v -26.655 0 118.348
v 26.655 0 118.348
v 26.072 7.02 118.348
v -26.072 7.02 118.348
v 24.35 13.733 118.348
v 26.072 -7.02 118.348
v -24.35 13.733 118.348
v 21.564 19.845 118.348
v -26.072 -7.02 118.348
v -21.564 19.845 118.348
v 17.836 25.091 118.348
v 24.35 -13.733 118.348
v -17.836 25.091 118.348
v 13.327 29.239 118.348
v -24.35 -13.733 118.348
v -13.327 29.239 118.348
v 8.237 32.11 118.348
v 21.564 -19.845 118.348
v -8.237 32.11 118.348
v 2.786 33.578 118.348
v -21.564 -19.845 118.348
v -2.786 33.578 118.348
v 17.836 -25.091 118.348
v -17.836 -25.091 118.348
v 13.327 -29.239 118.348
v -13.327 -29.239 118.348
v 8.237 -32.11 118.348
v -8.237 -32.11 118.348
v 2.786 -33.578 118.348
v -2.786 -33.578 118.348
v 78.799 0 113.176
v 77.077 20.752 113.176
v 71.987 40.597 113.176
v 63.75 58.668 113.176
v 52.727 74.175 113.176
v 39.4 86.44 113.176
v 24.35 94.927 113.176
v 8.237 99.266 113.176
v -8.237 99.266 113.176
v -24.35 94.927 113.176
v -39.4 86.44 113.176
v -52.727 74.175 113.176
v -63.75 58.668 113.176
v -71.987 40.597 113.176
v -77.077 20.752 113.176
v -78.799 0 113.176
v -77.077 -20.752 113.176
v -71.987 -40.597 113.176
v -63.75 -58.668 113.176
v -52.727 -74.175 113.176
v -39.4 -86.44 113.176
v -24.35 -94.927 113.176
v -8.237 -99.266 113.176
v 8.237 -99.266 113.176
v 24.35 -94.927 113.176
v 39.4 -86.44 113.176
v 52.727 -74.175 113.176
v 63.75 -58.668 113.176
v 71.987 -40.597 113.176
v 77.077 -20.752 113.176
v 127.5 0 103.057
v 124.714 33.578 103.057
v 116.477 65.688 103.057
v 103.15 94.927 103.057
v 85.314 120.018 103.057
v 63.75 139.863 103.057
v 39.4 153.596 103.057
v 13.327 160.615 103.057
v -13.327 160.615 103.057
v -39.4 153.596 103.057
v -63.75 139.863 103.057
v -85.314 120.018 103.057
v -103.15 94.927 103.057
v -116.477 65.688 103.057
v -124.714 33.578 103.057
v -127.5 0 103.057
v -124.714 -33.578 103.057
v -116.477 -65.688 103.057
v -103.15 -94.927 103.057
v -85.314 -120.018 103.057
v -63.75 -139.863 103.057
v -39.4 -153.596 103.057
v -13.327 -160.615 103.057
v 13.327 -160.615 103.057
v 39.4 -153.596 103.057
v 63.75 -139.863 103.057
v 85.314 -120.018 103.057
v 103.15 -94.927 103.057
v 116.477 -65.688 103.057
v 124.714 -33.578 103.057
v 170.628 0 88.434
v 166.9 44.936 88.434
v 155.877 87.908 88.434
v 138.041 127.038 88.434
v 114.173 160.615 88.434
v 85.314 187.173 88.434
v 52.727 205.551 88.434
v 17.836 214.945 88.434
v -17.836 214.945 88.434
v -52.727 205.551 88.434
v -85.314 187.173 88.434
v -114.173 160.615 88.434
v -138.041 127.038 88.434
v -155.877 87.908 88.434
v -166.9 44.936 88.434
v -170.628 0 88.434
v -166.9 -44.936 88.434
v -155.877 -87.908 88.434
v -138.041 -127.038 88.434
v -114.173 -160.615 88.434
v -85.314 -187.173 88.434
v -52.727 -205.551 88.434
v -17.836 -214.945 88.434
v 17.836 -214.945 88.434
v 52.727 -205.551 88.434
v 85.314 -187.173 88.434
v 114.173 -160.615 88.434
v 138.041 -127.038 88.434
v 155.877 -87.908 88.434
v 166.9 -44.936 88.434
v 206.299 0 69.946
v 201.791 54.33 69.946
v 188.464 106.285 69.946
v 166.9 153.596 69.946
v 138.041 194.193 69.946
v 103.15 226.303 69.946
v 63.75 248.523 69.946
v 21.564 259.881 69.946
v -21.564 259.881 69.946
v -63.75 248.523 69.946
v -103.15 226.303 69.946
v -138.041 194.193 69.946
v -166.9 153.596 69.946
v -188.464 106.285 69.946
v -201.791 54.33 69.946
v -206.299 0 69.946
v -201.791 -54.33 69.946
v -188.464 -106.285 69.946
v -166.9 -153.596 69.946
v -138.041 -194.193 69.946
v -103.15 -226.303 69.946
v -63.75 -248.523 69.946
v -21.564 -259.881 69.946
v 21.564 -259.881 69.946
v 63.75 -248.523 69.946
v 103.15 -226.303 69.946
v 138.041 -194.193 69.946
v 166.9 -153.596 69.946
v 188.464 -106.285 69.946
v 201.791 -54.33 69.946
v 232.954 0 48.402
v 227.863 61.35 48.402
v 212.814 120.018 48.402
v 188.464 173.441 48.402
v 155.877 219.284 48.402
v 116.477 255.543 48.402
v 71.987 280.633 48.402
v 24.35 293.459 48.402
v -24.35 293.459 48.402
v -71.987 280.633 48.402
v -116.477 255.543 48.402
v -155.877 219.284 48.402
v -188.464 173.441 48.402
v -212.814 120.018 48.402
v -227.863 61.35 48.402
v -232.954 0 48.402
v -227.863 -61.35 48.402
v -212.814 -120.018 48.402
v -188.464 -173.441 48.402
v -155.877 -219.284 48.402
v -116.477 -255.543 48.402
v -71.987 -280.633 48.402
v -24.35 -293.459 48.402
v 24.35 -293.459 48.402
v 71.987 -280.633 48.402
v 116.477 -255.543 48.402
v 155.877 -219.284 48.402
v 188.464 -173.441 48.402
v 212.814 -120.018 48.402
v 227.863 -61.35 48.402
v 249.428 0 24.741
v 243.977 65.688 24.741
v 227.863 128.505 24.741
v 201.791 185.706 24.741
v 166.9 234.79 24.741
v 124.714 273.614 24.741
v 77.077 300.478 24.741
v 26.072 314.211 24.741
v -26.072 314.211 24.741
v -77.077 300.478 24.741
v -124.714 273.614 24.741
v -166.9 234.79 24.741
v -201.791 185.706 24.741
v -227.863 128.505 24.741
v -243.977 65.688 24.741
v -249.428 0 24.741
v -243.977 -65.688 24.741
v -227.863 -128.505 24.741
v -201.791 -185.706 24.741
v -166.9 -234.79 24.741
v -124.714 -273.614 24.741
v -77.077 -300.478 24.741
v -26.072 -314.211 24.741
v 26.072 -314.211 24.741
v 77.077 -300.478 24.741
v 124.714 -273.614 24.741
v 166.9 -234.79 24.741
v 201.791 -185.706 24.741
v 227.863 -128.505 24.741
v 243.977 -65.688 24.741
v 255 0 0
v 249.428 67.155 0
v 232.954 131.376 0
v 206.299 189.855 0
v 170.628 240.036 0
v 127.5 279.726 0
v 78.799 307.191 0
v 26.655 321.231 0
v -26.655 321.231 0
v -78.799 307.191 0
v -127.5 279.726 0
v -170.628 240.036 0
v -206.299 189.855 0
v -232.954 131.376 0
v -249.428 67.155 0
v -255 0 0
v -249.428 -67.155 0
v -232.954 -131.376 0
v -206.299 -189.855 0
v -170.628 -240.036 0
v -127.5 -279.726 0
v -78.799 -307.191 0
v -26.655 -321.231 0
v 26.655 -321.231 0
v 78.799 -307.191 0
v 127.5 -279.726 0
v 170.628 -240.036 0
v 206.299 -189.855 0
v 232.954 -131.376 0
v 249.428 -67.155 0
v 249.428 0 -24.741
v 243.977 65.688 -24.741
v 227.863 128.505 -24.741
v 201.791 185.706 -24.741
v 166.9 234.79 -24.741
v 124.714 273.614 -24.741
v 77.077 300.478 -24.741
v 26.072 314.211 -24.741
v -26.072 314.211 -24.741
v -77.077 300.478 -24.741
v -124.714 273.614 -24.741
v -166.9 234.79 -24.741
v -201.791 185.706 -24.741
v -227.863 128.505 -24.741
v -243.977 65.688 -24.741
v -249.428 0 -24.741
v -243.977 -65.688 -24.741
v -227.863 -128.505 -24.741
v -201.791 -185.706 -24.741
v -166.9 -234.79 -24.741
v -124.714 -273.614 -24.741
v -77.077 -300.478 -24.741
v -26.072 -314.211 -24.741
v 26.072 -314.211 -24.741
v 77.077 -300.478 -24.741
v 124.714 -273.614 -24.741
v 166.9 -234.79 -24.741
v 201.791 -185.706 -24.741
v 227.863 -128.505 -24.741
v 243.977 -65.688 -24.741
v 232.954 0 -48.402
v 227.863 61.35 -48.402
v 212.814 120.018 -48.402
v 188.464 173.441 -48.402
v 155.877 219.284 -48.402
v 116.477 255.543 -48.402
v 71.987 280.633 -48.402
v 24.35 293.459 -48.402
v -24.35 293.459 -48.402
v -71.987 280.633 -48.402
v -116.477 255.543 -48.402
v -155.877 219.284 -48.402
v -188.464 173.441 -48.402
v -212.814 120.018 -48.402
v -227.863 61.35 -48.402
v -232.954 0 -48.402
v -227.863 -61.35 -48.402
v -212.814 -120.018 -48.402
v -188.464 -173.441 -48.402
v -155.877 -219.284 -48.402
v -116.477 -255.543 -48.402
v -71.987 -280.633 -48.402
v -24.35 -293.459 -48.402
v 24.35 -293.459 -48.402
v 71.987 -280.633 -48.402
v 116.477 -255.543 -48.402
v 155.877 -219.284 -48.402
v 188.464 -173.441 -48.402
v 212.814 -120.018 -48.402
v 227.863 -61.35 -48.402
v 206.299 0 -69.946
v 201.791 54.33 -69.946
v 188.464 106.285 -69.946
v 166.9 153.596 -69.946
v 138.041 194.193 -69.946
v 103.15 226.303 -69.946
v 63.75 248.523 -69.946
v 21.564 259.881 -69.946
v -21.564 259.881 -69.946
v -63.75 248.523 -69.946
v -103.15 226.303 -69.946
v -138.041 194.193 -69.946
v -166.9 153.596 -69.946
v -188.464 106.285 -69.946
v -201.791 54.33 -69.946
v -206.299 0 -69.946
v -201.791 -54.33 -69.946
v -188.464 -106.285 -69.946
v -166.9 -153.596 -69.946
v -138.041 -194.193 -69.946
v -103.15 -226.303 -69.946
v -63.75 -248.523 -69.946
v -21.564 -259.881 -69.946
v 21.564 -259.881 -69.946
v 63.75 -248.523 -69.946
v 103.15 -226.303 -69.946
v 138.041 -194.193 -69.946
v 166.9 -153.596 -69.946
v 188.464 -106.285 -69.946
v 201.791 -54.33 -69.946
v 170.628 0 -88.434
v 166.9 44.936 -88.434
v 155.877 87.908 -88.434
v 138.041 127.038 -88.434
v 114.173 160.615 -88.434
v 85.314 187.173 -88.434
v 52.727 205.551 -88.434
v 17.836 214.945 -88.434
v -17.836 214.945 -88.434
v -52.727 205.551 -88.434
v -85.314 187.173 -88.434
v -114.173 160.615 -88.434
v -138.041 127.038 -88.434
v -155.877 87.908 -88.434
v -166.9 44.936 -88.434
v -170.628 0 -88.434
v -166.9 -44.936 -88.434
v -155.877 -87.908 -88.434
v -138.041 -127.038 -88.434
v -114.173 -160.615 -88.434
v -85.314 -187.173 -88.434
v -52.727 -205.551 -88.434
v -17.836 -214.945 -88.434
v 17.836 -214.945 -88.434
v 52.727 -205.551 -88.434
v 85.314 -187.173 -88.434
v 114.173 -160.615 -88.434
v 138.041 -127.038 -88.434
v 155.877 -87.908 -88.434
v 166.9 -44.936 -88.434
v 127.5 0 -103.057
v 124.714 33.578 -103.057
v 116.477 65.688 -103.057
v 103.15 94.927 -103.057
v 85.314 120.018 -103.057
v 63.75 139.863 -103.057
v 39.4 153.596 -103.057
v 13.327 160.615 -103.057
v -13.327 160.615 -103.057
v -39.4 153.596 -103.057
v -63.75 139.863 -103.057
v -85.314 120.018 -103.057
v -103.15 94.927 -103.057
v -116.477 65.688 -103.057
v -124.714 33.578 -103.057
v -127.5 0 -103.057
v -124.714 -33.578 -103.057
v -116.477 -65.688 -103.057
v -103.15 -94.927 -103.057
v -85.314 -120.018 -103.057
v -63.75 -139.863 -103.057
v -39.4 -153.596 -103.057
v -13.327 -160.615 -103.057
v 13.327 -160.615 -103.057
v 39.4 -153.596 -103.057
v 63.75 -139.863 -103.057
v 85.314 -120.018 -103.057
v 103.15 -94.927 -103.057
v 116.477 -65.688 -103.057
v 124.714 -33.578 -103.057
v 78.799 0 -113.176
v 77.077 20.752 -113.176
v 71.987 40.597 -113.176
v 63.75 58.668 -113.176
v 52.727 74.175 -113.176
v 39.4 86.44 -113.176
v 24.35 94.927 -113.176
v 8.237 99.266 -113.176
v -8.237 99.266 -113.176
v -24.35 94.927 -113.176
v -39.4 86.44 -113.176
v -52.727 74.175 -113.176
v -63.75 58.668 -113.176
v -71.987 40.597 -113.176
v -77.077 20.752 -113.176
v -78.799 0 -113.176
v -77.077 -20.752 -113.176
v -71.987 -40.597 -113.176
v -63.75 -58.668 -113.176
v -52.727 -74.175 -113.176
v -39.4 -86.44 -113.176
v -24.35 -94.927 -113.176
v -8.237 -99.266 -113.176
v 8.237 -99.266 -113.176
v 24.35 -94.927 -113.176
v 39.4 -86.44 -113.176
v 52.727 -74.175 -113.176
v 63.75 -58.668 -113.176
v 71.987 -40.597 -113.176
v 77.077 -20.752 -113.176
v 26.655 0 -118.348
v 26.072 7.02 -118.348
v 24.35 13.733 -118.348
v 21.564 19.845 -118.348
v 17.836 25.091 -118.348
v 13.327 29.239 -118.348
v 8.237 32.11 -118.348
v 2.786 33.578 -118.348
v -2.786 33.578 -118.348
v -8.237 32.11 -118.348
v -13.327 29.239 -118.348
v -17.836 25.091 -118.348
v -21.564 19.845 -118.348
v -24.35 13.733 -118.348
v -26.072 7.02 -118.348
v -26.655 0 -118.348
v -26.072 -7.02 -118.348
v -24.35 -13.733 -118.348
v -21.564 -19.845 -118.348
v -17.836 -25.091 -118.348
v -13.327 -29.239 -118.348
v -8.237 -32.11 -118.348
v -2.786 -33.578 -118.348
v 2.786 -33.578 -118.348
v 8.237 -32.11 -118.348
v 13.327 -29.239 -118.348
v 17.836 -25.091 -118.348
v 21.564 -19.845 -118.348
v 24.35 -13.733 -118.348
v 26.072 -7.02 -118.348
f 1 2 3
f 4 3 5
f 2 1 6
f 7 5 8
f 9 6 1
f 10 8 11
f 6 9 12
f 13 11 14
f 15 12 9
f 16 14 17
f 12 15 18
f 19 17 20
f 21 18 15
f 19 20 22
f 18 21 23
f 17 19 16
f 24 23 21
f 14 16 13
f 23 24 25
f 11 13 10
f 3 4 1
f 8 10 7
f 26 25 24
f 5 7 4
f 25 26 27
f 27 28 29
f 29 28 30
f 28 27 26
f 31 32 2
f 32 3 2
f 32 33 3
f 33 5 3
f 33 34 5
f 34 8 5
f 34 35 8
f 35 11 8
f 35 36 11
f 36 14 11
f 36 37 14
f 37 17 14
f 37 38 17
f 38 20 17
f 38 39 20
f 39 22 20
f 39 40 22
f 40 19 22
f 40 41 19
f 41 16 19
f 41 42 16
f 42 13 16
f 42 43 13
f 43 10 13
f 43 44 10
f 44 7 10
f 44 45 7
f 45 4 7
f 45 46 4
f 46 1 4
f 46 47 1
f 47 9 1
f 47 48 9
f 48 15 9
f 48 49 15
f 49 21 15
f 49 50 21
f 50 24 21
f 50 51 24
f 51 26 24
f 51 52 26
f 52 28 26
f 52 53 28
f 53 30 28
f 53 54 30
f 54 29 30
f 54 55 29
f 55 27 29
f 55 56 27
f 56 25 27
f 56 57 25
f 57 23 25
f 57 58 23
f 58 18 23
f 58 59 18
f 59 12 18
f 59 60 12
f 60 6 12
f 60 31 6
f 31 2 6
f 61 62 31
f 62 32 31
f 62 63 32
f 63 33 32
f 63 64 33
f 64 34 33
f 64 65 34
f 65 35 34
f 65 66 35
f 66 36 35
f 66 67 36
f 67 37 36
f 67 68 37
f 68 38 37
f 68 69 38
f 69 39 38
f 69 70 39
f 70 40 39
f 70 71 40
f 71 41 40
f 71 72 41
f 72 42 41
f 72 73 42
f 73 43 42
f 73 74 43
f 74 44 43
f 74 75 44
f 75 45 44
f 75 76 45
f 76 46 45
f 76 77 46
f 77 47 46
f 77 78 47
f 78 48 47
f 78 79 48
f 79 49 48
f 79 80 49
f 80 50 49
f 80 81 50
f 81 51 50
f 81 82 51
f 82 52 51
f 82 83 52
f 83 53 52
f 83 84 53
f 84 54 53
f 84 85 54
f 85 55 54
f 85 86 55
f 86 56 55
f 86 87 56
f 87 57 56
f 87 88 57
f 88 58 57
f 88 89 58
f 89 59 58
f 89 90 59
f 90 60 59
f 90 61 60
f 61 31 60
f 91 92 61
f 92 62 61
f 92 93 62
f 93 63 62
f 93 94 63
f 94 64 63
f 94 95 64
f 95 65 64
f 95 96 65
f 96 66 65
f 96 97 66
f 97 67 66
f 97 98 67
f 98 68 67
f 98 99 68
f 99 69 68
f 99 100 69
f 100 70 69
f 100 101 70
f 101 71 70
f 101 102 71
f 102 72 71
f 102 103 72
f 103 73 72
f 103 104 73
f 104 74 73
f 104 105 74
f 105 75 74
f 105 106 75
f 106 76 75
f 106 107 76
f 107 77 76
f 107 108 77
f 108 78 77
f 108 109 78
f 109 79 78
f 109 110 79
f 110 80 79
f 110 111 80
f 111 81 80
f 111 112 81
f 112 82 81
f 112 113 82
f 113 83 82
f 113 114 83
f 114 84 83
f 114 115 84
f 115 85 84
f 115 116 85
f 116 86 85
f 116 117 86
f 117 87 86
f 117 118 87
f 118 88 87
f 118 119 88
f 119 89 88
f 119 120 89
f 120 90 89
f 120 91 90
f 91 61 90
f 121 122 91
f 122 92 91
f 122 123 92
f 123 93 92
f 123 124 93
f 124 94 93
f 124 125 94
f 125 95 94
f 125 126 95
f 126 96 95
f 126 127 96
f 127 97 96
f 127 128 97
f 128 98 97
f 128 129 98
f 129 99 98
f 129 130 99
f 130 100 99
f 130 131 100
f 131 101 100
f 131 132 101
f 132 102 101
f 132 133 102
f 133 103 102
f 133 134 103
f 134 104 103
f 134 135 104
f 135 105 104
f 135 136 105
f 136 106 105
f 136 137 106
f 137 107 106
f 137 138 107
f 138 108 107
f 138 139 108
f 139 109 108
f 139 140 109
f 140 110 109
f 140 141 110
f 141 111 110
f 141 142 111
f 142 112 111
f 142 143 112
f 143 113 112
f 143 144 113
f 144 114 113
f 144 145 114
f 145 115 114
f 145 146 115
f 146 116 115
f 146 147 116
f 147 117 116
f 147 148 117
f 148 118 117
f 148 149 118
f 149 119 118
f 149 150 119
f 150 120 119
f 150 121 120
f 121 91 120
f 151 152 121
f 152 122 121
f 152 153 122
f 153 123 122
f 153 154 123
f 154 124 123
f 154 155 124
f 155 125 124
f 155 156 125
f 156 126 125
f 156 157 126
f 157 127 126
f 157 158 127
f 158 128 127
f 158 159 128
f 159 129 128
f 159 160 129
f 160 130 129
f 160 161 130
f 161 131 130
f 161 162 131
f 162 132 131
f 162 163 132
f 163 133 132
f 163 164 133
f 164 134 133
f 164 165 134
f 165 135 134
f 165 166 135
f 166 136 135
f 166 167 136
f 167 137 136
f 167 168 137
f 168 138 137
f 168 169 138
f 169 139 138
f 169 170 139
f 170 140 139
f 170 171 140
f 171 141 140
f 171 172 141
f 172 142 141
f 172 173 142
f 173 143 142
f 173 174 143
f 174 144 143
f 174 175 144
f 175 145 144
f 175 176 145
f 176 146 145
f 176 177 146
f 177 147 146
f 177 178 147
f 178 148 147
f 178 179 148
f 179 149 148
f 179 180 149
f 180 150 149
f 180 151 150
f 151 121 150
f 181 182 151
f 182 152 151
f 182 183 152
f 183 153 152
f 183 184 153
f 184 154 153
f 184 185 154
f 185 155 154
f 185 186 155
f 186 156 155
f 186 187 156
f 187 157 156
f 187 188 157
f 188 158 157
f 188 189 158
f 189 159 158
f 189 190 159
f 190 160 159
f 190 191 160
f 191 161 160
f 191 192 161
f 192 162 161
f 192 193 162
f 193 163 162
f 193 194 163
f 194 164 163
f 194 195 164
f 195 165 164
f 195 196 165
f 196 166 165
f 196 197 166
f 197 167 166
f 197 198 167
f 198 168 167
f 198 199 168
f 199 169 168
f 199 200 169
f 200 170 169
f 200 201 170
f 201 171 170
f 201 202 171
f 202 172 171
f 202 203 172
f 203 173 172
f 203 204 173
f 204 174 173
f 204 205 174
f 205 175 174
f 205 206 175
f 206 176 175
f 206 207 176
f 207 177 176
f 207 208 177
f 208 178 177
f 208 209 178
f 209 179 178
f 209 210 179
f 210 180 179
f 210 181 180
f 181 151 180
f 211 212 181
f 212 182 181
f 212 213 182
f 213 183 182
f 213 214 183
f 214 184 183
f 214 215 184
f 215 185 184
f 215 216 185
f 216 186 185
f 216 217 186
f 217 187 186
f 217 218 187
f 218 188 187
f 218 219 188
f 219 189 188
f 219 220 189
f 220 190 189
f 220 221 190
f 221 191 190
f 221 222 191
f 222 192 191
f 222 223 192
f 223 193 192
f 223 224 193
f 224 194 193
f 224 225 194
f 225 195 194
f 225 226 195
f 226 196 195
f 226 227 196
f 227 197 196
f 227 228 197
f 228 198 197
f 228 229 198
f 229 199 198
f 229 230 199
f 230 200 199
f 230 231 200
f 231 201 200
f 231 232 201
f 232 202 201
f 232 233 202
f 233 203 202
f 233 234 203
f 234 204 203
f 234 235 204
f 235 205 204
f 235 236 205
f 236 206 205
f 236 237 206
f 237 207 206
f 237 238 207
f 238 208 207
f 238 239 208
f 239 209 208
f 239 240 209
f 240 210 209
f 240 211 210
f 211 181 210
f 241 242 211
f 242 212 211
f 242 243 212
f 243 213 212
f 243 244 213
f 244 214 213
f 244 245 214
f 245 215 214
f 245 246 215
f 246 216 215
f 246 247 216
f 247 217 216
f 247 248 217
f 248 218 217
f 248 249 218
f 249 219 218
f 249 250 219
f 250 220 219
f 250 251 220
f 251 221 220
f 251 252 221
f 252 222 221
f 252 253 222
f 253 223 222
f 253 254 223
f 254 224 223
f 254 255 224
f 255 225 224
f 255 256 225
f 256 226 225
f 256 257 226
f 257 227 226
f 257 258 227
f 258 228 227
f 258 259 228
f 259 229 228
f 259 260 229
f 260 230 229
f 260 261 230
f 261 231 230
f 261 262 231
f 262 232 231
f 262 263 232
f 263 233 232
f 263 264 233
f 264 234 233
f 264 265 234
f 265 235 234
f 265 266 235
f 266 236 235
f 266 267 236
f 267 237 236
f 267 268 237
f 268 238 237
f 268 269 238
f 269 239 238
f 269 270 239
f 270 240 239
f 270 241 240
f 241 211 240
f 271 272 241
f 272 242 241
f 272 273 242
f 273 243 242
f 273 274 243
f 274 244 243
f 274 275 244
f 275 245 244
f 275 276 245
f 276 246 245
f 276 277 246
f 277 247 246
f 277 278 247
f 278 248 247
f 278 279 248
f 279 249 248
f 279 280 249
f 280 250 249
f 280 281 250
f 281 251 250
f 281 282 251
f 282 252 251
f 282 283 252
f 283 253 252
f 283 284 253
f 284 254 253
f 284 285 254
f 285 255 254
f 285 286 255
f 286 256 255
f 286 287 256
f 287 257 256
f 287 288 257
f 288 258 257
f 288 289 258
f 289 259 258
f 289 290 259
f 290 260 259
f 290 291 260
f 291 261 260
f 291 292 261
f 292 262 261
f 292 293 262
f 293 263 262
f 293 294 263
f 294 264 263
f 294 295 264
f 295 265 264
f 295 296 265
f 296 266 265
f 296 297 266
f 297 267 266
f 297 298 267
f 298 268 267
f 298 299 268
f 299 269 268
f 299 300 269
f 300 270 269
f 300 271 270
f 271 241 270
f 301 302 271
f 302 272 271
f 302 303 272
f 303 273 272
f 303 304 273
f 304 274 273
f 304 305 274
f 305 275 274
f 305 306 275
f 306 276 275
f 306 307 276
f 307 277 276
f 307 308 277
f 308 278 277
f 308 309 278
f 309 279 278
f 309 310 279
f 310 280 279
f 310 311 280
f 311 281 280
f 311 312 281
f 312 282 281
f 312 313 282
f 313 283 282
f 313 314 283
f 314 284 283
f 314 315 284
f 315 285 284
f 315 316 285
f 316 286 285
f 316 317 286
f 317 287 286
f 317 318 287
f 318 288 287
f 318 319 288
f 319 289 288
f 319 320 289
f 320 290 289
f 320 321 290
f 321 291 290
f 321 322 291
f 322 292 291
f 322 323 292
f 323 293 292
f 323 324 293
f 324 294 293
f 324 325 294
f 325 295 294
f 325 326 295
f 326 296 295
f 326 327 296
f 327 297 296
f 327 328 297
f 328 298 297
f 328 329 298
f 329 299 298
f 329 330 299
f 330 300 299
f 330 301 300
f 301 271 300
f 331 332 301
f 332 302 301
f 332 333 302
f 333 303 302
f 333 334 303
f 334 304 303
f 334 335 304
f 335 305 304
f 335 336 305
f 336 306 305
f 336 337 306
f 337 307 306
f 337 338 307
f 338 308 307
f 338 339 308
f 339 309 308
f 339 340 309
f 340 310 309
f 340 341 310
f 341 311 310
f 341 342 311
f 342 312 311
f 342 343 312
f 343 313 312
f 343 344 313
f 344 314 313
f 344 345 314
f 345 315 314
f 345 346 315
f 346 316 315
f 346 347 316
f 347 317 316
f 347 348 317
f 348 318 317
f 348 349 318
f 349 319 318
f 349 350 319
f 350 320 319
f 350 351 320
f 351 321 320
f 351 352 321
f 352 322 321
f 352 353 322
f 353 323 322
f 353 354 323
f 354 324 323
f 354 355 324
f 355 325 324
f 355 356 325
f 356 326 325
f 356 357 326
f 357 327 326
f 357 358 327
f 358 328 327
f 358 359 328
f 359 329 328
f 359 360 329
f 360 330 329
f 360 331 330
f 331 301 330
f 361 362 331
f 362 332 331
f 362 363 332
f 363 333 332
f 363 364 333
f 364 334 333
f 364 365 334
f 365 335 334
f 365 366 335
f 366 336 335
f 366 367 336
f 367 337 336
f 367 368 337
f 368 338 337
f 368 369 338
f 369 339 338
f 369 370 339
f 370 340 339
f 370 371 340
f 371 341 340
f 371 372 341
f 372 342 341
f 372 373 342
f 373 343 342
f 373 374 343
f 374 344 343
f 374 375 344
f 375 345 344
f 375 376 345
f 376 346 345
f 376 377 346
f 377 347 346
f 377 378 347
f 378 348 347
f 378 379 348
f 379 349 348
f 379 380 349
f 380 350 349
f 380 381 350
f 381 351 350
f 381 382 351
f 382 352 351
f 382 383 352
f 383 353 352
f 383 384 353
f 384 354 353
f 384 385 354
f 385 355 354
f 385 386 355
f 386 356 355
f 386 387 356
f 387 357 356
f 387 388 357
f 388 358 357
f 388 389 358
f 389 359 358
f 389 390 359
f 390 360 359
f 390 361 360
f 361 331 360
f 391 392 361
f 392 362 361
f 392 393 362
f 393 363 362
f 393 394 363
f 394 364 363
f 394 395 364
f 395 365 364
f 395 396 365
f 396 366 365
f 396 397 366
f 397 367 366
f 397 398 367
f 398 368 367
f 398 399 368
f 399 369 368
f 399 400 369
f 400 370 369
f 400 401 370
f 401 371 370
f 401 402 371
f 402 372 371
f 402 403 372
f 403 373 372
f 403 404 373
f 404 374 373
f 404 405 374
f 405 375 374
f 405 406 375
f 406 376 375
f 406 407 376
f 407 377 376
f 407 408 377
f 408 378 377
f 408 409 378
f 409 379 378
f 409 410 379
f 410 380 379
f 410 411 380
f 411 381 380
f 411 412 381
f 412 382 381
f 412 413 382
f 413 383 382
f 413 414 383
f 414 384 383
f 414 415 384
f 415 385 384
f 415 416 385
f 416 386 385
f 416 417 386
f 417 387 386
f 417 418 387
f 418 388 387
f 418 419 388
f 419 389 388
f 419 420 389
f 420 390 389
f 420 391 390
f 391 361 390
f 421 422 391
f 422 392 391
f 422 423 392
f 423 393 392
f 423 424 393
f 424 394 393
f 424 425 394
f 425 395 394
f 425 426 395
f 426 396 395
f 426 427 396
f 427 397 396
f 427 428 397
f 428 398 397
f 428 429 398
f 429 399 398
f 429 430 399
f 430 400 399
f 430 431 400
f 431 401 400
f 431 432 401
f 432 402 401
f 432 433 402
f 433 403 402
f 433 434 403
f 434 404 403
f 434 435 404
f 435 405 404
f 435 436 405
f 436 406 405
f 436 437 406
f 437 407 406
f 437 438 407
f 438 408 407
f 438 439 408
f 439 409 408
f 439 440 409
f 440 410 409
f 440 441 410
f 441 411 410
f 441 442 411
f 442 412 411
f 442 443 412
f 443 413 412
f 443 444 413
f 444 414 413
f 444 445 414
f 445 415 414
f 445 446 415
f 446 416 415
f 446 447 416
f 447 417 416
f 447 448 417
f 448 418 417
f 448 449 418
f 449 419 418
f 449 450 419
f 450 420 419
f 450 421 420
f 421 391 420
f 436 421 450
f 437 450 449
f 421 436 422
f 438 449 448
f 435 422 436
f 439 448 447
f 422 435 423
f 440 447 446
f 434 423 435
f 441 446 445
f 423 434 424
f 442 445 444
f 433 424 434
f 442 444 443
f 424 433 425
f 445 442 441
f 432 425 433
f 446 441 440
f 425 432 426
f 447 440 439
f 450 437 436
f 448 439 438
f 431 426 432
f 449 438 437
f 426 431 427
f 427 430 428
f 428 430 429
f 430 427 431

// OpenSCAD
// Generated by SolidPython 1.0.1 on 2020-07-29 00:46:52


scale(v = [15, 19, 7]) {
	sphere(r = 17);
}
/***********************************************
*********      SolidPython code:      **********
************************************************
 
# import packages: SolidPython
from solid import *
from solid.utils import *
from itertools import chain, combinations, permutations


class Resize:

    def __init__(self, scad_file):
        self.scad_file = scad_file
        #self.scad_file = import_scad(scad_file)
        # cone/cylinder param:
        self.r1 = 0
        self.r2 = 0
        self.h = 0
        # rectangular prism param:
        self.w = 0
        self.l = 0
        # ellipse param:
        self.r = 0

    # import OpenScad code (file name corresponds to shape)


    # classify shape + parameters
    def assign(self, param1, param2, param3):
        if self.scad_file == 'cone.scad':
            self.r1 = param1
            self.r2 = param2
            self.h = param3
        elif self.scad_file == 'cylinder.scad':
            self.r1 = param1
            self.r2 = param2
            self.h = param3
        elif self.scad_file == 'rectangularPrism.scad':
            self.h = param1
            self.l = param2
            self.w = param3
        else:
            self.r = param1
            self.h = param2

    # resize parameters
    def iterate(self):
        x = range(3, 20, 2)
        i = 1
        if self.scad_file == 'cone.scad':
            tempList = list(permutations(x, 2))
            for temp in tempList:
                param1 = temp[0]
                param2 = temp[1]
                filepath = 'produced_scad_files/' + 'cone' + str(param1) + '_' + str(param2) + '_' + '.scad'
                scad_render_to_file(cylinder(h=param1, r1=param2, r2=0), filepath)

        elif self.scad_file == 'cylinder.scad':
            tempList = list(permutations(x, 3))
            for temp in tempList:
                param1 = temp[0]
                param2 = temp[1]
                filepath = 'produced_scad_files/' + 'cylinder' + str(param1) + '_' + str(param2) + '_' + '.scad'
                scad_render_to_file(cylinder(h=param1, r1=param2, r2=param2), filepath)

        elif self.scad_file == 'rectangularPrism.scad':
            tempList = list(permutations(x, 3))
            for temp in tempList:
                param1 = temp[0]
                param2 = temp[1]
                param3 = temp[2]
                filepath = 'produced_scad_files/' + 'rectangularPrism' + str(param1) + '_' + str(param2) + '_' + str(
                    param3) + '.scad'
                scad_render_to_file(cube(size=(param1, param2, param3)), filepath)

        elif self.scad_file == 'ellipse.scad':
            tempList = list(permutations(x, 4))
            for temp in tempList:
                param1 = temp[0]
                param2 = temp[1]
                param3 = temp[2]
                param4 = temp[3]
                filepath = 'produced_scad_files/' + 'ellipse' + str(param1) + '_' + str(param2) + '_' + str(param3) + '_' + str(param4) + '.scad'
                scad_render_to_file(scale([param1, param2, param3])(sphere(r=param4)), filepath)

    def render_to_scadfile(self):
        scad_render_to_file(scad, 'example.scad') 
 
************************************************/
